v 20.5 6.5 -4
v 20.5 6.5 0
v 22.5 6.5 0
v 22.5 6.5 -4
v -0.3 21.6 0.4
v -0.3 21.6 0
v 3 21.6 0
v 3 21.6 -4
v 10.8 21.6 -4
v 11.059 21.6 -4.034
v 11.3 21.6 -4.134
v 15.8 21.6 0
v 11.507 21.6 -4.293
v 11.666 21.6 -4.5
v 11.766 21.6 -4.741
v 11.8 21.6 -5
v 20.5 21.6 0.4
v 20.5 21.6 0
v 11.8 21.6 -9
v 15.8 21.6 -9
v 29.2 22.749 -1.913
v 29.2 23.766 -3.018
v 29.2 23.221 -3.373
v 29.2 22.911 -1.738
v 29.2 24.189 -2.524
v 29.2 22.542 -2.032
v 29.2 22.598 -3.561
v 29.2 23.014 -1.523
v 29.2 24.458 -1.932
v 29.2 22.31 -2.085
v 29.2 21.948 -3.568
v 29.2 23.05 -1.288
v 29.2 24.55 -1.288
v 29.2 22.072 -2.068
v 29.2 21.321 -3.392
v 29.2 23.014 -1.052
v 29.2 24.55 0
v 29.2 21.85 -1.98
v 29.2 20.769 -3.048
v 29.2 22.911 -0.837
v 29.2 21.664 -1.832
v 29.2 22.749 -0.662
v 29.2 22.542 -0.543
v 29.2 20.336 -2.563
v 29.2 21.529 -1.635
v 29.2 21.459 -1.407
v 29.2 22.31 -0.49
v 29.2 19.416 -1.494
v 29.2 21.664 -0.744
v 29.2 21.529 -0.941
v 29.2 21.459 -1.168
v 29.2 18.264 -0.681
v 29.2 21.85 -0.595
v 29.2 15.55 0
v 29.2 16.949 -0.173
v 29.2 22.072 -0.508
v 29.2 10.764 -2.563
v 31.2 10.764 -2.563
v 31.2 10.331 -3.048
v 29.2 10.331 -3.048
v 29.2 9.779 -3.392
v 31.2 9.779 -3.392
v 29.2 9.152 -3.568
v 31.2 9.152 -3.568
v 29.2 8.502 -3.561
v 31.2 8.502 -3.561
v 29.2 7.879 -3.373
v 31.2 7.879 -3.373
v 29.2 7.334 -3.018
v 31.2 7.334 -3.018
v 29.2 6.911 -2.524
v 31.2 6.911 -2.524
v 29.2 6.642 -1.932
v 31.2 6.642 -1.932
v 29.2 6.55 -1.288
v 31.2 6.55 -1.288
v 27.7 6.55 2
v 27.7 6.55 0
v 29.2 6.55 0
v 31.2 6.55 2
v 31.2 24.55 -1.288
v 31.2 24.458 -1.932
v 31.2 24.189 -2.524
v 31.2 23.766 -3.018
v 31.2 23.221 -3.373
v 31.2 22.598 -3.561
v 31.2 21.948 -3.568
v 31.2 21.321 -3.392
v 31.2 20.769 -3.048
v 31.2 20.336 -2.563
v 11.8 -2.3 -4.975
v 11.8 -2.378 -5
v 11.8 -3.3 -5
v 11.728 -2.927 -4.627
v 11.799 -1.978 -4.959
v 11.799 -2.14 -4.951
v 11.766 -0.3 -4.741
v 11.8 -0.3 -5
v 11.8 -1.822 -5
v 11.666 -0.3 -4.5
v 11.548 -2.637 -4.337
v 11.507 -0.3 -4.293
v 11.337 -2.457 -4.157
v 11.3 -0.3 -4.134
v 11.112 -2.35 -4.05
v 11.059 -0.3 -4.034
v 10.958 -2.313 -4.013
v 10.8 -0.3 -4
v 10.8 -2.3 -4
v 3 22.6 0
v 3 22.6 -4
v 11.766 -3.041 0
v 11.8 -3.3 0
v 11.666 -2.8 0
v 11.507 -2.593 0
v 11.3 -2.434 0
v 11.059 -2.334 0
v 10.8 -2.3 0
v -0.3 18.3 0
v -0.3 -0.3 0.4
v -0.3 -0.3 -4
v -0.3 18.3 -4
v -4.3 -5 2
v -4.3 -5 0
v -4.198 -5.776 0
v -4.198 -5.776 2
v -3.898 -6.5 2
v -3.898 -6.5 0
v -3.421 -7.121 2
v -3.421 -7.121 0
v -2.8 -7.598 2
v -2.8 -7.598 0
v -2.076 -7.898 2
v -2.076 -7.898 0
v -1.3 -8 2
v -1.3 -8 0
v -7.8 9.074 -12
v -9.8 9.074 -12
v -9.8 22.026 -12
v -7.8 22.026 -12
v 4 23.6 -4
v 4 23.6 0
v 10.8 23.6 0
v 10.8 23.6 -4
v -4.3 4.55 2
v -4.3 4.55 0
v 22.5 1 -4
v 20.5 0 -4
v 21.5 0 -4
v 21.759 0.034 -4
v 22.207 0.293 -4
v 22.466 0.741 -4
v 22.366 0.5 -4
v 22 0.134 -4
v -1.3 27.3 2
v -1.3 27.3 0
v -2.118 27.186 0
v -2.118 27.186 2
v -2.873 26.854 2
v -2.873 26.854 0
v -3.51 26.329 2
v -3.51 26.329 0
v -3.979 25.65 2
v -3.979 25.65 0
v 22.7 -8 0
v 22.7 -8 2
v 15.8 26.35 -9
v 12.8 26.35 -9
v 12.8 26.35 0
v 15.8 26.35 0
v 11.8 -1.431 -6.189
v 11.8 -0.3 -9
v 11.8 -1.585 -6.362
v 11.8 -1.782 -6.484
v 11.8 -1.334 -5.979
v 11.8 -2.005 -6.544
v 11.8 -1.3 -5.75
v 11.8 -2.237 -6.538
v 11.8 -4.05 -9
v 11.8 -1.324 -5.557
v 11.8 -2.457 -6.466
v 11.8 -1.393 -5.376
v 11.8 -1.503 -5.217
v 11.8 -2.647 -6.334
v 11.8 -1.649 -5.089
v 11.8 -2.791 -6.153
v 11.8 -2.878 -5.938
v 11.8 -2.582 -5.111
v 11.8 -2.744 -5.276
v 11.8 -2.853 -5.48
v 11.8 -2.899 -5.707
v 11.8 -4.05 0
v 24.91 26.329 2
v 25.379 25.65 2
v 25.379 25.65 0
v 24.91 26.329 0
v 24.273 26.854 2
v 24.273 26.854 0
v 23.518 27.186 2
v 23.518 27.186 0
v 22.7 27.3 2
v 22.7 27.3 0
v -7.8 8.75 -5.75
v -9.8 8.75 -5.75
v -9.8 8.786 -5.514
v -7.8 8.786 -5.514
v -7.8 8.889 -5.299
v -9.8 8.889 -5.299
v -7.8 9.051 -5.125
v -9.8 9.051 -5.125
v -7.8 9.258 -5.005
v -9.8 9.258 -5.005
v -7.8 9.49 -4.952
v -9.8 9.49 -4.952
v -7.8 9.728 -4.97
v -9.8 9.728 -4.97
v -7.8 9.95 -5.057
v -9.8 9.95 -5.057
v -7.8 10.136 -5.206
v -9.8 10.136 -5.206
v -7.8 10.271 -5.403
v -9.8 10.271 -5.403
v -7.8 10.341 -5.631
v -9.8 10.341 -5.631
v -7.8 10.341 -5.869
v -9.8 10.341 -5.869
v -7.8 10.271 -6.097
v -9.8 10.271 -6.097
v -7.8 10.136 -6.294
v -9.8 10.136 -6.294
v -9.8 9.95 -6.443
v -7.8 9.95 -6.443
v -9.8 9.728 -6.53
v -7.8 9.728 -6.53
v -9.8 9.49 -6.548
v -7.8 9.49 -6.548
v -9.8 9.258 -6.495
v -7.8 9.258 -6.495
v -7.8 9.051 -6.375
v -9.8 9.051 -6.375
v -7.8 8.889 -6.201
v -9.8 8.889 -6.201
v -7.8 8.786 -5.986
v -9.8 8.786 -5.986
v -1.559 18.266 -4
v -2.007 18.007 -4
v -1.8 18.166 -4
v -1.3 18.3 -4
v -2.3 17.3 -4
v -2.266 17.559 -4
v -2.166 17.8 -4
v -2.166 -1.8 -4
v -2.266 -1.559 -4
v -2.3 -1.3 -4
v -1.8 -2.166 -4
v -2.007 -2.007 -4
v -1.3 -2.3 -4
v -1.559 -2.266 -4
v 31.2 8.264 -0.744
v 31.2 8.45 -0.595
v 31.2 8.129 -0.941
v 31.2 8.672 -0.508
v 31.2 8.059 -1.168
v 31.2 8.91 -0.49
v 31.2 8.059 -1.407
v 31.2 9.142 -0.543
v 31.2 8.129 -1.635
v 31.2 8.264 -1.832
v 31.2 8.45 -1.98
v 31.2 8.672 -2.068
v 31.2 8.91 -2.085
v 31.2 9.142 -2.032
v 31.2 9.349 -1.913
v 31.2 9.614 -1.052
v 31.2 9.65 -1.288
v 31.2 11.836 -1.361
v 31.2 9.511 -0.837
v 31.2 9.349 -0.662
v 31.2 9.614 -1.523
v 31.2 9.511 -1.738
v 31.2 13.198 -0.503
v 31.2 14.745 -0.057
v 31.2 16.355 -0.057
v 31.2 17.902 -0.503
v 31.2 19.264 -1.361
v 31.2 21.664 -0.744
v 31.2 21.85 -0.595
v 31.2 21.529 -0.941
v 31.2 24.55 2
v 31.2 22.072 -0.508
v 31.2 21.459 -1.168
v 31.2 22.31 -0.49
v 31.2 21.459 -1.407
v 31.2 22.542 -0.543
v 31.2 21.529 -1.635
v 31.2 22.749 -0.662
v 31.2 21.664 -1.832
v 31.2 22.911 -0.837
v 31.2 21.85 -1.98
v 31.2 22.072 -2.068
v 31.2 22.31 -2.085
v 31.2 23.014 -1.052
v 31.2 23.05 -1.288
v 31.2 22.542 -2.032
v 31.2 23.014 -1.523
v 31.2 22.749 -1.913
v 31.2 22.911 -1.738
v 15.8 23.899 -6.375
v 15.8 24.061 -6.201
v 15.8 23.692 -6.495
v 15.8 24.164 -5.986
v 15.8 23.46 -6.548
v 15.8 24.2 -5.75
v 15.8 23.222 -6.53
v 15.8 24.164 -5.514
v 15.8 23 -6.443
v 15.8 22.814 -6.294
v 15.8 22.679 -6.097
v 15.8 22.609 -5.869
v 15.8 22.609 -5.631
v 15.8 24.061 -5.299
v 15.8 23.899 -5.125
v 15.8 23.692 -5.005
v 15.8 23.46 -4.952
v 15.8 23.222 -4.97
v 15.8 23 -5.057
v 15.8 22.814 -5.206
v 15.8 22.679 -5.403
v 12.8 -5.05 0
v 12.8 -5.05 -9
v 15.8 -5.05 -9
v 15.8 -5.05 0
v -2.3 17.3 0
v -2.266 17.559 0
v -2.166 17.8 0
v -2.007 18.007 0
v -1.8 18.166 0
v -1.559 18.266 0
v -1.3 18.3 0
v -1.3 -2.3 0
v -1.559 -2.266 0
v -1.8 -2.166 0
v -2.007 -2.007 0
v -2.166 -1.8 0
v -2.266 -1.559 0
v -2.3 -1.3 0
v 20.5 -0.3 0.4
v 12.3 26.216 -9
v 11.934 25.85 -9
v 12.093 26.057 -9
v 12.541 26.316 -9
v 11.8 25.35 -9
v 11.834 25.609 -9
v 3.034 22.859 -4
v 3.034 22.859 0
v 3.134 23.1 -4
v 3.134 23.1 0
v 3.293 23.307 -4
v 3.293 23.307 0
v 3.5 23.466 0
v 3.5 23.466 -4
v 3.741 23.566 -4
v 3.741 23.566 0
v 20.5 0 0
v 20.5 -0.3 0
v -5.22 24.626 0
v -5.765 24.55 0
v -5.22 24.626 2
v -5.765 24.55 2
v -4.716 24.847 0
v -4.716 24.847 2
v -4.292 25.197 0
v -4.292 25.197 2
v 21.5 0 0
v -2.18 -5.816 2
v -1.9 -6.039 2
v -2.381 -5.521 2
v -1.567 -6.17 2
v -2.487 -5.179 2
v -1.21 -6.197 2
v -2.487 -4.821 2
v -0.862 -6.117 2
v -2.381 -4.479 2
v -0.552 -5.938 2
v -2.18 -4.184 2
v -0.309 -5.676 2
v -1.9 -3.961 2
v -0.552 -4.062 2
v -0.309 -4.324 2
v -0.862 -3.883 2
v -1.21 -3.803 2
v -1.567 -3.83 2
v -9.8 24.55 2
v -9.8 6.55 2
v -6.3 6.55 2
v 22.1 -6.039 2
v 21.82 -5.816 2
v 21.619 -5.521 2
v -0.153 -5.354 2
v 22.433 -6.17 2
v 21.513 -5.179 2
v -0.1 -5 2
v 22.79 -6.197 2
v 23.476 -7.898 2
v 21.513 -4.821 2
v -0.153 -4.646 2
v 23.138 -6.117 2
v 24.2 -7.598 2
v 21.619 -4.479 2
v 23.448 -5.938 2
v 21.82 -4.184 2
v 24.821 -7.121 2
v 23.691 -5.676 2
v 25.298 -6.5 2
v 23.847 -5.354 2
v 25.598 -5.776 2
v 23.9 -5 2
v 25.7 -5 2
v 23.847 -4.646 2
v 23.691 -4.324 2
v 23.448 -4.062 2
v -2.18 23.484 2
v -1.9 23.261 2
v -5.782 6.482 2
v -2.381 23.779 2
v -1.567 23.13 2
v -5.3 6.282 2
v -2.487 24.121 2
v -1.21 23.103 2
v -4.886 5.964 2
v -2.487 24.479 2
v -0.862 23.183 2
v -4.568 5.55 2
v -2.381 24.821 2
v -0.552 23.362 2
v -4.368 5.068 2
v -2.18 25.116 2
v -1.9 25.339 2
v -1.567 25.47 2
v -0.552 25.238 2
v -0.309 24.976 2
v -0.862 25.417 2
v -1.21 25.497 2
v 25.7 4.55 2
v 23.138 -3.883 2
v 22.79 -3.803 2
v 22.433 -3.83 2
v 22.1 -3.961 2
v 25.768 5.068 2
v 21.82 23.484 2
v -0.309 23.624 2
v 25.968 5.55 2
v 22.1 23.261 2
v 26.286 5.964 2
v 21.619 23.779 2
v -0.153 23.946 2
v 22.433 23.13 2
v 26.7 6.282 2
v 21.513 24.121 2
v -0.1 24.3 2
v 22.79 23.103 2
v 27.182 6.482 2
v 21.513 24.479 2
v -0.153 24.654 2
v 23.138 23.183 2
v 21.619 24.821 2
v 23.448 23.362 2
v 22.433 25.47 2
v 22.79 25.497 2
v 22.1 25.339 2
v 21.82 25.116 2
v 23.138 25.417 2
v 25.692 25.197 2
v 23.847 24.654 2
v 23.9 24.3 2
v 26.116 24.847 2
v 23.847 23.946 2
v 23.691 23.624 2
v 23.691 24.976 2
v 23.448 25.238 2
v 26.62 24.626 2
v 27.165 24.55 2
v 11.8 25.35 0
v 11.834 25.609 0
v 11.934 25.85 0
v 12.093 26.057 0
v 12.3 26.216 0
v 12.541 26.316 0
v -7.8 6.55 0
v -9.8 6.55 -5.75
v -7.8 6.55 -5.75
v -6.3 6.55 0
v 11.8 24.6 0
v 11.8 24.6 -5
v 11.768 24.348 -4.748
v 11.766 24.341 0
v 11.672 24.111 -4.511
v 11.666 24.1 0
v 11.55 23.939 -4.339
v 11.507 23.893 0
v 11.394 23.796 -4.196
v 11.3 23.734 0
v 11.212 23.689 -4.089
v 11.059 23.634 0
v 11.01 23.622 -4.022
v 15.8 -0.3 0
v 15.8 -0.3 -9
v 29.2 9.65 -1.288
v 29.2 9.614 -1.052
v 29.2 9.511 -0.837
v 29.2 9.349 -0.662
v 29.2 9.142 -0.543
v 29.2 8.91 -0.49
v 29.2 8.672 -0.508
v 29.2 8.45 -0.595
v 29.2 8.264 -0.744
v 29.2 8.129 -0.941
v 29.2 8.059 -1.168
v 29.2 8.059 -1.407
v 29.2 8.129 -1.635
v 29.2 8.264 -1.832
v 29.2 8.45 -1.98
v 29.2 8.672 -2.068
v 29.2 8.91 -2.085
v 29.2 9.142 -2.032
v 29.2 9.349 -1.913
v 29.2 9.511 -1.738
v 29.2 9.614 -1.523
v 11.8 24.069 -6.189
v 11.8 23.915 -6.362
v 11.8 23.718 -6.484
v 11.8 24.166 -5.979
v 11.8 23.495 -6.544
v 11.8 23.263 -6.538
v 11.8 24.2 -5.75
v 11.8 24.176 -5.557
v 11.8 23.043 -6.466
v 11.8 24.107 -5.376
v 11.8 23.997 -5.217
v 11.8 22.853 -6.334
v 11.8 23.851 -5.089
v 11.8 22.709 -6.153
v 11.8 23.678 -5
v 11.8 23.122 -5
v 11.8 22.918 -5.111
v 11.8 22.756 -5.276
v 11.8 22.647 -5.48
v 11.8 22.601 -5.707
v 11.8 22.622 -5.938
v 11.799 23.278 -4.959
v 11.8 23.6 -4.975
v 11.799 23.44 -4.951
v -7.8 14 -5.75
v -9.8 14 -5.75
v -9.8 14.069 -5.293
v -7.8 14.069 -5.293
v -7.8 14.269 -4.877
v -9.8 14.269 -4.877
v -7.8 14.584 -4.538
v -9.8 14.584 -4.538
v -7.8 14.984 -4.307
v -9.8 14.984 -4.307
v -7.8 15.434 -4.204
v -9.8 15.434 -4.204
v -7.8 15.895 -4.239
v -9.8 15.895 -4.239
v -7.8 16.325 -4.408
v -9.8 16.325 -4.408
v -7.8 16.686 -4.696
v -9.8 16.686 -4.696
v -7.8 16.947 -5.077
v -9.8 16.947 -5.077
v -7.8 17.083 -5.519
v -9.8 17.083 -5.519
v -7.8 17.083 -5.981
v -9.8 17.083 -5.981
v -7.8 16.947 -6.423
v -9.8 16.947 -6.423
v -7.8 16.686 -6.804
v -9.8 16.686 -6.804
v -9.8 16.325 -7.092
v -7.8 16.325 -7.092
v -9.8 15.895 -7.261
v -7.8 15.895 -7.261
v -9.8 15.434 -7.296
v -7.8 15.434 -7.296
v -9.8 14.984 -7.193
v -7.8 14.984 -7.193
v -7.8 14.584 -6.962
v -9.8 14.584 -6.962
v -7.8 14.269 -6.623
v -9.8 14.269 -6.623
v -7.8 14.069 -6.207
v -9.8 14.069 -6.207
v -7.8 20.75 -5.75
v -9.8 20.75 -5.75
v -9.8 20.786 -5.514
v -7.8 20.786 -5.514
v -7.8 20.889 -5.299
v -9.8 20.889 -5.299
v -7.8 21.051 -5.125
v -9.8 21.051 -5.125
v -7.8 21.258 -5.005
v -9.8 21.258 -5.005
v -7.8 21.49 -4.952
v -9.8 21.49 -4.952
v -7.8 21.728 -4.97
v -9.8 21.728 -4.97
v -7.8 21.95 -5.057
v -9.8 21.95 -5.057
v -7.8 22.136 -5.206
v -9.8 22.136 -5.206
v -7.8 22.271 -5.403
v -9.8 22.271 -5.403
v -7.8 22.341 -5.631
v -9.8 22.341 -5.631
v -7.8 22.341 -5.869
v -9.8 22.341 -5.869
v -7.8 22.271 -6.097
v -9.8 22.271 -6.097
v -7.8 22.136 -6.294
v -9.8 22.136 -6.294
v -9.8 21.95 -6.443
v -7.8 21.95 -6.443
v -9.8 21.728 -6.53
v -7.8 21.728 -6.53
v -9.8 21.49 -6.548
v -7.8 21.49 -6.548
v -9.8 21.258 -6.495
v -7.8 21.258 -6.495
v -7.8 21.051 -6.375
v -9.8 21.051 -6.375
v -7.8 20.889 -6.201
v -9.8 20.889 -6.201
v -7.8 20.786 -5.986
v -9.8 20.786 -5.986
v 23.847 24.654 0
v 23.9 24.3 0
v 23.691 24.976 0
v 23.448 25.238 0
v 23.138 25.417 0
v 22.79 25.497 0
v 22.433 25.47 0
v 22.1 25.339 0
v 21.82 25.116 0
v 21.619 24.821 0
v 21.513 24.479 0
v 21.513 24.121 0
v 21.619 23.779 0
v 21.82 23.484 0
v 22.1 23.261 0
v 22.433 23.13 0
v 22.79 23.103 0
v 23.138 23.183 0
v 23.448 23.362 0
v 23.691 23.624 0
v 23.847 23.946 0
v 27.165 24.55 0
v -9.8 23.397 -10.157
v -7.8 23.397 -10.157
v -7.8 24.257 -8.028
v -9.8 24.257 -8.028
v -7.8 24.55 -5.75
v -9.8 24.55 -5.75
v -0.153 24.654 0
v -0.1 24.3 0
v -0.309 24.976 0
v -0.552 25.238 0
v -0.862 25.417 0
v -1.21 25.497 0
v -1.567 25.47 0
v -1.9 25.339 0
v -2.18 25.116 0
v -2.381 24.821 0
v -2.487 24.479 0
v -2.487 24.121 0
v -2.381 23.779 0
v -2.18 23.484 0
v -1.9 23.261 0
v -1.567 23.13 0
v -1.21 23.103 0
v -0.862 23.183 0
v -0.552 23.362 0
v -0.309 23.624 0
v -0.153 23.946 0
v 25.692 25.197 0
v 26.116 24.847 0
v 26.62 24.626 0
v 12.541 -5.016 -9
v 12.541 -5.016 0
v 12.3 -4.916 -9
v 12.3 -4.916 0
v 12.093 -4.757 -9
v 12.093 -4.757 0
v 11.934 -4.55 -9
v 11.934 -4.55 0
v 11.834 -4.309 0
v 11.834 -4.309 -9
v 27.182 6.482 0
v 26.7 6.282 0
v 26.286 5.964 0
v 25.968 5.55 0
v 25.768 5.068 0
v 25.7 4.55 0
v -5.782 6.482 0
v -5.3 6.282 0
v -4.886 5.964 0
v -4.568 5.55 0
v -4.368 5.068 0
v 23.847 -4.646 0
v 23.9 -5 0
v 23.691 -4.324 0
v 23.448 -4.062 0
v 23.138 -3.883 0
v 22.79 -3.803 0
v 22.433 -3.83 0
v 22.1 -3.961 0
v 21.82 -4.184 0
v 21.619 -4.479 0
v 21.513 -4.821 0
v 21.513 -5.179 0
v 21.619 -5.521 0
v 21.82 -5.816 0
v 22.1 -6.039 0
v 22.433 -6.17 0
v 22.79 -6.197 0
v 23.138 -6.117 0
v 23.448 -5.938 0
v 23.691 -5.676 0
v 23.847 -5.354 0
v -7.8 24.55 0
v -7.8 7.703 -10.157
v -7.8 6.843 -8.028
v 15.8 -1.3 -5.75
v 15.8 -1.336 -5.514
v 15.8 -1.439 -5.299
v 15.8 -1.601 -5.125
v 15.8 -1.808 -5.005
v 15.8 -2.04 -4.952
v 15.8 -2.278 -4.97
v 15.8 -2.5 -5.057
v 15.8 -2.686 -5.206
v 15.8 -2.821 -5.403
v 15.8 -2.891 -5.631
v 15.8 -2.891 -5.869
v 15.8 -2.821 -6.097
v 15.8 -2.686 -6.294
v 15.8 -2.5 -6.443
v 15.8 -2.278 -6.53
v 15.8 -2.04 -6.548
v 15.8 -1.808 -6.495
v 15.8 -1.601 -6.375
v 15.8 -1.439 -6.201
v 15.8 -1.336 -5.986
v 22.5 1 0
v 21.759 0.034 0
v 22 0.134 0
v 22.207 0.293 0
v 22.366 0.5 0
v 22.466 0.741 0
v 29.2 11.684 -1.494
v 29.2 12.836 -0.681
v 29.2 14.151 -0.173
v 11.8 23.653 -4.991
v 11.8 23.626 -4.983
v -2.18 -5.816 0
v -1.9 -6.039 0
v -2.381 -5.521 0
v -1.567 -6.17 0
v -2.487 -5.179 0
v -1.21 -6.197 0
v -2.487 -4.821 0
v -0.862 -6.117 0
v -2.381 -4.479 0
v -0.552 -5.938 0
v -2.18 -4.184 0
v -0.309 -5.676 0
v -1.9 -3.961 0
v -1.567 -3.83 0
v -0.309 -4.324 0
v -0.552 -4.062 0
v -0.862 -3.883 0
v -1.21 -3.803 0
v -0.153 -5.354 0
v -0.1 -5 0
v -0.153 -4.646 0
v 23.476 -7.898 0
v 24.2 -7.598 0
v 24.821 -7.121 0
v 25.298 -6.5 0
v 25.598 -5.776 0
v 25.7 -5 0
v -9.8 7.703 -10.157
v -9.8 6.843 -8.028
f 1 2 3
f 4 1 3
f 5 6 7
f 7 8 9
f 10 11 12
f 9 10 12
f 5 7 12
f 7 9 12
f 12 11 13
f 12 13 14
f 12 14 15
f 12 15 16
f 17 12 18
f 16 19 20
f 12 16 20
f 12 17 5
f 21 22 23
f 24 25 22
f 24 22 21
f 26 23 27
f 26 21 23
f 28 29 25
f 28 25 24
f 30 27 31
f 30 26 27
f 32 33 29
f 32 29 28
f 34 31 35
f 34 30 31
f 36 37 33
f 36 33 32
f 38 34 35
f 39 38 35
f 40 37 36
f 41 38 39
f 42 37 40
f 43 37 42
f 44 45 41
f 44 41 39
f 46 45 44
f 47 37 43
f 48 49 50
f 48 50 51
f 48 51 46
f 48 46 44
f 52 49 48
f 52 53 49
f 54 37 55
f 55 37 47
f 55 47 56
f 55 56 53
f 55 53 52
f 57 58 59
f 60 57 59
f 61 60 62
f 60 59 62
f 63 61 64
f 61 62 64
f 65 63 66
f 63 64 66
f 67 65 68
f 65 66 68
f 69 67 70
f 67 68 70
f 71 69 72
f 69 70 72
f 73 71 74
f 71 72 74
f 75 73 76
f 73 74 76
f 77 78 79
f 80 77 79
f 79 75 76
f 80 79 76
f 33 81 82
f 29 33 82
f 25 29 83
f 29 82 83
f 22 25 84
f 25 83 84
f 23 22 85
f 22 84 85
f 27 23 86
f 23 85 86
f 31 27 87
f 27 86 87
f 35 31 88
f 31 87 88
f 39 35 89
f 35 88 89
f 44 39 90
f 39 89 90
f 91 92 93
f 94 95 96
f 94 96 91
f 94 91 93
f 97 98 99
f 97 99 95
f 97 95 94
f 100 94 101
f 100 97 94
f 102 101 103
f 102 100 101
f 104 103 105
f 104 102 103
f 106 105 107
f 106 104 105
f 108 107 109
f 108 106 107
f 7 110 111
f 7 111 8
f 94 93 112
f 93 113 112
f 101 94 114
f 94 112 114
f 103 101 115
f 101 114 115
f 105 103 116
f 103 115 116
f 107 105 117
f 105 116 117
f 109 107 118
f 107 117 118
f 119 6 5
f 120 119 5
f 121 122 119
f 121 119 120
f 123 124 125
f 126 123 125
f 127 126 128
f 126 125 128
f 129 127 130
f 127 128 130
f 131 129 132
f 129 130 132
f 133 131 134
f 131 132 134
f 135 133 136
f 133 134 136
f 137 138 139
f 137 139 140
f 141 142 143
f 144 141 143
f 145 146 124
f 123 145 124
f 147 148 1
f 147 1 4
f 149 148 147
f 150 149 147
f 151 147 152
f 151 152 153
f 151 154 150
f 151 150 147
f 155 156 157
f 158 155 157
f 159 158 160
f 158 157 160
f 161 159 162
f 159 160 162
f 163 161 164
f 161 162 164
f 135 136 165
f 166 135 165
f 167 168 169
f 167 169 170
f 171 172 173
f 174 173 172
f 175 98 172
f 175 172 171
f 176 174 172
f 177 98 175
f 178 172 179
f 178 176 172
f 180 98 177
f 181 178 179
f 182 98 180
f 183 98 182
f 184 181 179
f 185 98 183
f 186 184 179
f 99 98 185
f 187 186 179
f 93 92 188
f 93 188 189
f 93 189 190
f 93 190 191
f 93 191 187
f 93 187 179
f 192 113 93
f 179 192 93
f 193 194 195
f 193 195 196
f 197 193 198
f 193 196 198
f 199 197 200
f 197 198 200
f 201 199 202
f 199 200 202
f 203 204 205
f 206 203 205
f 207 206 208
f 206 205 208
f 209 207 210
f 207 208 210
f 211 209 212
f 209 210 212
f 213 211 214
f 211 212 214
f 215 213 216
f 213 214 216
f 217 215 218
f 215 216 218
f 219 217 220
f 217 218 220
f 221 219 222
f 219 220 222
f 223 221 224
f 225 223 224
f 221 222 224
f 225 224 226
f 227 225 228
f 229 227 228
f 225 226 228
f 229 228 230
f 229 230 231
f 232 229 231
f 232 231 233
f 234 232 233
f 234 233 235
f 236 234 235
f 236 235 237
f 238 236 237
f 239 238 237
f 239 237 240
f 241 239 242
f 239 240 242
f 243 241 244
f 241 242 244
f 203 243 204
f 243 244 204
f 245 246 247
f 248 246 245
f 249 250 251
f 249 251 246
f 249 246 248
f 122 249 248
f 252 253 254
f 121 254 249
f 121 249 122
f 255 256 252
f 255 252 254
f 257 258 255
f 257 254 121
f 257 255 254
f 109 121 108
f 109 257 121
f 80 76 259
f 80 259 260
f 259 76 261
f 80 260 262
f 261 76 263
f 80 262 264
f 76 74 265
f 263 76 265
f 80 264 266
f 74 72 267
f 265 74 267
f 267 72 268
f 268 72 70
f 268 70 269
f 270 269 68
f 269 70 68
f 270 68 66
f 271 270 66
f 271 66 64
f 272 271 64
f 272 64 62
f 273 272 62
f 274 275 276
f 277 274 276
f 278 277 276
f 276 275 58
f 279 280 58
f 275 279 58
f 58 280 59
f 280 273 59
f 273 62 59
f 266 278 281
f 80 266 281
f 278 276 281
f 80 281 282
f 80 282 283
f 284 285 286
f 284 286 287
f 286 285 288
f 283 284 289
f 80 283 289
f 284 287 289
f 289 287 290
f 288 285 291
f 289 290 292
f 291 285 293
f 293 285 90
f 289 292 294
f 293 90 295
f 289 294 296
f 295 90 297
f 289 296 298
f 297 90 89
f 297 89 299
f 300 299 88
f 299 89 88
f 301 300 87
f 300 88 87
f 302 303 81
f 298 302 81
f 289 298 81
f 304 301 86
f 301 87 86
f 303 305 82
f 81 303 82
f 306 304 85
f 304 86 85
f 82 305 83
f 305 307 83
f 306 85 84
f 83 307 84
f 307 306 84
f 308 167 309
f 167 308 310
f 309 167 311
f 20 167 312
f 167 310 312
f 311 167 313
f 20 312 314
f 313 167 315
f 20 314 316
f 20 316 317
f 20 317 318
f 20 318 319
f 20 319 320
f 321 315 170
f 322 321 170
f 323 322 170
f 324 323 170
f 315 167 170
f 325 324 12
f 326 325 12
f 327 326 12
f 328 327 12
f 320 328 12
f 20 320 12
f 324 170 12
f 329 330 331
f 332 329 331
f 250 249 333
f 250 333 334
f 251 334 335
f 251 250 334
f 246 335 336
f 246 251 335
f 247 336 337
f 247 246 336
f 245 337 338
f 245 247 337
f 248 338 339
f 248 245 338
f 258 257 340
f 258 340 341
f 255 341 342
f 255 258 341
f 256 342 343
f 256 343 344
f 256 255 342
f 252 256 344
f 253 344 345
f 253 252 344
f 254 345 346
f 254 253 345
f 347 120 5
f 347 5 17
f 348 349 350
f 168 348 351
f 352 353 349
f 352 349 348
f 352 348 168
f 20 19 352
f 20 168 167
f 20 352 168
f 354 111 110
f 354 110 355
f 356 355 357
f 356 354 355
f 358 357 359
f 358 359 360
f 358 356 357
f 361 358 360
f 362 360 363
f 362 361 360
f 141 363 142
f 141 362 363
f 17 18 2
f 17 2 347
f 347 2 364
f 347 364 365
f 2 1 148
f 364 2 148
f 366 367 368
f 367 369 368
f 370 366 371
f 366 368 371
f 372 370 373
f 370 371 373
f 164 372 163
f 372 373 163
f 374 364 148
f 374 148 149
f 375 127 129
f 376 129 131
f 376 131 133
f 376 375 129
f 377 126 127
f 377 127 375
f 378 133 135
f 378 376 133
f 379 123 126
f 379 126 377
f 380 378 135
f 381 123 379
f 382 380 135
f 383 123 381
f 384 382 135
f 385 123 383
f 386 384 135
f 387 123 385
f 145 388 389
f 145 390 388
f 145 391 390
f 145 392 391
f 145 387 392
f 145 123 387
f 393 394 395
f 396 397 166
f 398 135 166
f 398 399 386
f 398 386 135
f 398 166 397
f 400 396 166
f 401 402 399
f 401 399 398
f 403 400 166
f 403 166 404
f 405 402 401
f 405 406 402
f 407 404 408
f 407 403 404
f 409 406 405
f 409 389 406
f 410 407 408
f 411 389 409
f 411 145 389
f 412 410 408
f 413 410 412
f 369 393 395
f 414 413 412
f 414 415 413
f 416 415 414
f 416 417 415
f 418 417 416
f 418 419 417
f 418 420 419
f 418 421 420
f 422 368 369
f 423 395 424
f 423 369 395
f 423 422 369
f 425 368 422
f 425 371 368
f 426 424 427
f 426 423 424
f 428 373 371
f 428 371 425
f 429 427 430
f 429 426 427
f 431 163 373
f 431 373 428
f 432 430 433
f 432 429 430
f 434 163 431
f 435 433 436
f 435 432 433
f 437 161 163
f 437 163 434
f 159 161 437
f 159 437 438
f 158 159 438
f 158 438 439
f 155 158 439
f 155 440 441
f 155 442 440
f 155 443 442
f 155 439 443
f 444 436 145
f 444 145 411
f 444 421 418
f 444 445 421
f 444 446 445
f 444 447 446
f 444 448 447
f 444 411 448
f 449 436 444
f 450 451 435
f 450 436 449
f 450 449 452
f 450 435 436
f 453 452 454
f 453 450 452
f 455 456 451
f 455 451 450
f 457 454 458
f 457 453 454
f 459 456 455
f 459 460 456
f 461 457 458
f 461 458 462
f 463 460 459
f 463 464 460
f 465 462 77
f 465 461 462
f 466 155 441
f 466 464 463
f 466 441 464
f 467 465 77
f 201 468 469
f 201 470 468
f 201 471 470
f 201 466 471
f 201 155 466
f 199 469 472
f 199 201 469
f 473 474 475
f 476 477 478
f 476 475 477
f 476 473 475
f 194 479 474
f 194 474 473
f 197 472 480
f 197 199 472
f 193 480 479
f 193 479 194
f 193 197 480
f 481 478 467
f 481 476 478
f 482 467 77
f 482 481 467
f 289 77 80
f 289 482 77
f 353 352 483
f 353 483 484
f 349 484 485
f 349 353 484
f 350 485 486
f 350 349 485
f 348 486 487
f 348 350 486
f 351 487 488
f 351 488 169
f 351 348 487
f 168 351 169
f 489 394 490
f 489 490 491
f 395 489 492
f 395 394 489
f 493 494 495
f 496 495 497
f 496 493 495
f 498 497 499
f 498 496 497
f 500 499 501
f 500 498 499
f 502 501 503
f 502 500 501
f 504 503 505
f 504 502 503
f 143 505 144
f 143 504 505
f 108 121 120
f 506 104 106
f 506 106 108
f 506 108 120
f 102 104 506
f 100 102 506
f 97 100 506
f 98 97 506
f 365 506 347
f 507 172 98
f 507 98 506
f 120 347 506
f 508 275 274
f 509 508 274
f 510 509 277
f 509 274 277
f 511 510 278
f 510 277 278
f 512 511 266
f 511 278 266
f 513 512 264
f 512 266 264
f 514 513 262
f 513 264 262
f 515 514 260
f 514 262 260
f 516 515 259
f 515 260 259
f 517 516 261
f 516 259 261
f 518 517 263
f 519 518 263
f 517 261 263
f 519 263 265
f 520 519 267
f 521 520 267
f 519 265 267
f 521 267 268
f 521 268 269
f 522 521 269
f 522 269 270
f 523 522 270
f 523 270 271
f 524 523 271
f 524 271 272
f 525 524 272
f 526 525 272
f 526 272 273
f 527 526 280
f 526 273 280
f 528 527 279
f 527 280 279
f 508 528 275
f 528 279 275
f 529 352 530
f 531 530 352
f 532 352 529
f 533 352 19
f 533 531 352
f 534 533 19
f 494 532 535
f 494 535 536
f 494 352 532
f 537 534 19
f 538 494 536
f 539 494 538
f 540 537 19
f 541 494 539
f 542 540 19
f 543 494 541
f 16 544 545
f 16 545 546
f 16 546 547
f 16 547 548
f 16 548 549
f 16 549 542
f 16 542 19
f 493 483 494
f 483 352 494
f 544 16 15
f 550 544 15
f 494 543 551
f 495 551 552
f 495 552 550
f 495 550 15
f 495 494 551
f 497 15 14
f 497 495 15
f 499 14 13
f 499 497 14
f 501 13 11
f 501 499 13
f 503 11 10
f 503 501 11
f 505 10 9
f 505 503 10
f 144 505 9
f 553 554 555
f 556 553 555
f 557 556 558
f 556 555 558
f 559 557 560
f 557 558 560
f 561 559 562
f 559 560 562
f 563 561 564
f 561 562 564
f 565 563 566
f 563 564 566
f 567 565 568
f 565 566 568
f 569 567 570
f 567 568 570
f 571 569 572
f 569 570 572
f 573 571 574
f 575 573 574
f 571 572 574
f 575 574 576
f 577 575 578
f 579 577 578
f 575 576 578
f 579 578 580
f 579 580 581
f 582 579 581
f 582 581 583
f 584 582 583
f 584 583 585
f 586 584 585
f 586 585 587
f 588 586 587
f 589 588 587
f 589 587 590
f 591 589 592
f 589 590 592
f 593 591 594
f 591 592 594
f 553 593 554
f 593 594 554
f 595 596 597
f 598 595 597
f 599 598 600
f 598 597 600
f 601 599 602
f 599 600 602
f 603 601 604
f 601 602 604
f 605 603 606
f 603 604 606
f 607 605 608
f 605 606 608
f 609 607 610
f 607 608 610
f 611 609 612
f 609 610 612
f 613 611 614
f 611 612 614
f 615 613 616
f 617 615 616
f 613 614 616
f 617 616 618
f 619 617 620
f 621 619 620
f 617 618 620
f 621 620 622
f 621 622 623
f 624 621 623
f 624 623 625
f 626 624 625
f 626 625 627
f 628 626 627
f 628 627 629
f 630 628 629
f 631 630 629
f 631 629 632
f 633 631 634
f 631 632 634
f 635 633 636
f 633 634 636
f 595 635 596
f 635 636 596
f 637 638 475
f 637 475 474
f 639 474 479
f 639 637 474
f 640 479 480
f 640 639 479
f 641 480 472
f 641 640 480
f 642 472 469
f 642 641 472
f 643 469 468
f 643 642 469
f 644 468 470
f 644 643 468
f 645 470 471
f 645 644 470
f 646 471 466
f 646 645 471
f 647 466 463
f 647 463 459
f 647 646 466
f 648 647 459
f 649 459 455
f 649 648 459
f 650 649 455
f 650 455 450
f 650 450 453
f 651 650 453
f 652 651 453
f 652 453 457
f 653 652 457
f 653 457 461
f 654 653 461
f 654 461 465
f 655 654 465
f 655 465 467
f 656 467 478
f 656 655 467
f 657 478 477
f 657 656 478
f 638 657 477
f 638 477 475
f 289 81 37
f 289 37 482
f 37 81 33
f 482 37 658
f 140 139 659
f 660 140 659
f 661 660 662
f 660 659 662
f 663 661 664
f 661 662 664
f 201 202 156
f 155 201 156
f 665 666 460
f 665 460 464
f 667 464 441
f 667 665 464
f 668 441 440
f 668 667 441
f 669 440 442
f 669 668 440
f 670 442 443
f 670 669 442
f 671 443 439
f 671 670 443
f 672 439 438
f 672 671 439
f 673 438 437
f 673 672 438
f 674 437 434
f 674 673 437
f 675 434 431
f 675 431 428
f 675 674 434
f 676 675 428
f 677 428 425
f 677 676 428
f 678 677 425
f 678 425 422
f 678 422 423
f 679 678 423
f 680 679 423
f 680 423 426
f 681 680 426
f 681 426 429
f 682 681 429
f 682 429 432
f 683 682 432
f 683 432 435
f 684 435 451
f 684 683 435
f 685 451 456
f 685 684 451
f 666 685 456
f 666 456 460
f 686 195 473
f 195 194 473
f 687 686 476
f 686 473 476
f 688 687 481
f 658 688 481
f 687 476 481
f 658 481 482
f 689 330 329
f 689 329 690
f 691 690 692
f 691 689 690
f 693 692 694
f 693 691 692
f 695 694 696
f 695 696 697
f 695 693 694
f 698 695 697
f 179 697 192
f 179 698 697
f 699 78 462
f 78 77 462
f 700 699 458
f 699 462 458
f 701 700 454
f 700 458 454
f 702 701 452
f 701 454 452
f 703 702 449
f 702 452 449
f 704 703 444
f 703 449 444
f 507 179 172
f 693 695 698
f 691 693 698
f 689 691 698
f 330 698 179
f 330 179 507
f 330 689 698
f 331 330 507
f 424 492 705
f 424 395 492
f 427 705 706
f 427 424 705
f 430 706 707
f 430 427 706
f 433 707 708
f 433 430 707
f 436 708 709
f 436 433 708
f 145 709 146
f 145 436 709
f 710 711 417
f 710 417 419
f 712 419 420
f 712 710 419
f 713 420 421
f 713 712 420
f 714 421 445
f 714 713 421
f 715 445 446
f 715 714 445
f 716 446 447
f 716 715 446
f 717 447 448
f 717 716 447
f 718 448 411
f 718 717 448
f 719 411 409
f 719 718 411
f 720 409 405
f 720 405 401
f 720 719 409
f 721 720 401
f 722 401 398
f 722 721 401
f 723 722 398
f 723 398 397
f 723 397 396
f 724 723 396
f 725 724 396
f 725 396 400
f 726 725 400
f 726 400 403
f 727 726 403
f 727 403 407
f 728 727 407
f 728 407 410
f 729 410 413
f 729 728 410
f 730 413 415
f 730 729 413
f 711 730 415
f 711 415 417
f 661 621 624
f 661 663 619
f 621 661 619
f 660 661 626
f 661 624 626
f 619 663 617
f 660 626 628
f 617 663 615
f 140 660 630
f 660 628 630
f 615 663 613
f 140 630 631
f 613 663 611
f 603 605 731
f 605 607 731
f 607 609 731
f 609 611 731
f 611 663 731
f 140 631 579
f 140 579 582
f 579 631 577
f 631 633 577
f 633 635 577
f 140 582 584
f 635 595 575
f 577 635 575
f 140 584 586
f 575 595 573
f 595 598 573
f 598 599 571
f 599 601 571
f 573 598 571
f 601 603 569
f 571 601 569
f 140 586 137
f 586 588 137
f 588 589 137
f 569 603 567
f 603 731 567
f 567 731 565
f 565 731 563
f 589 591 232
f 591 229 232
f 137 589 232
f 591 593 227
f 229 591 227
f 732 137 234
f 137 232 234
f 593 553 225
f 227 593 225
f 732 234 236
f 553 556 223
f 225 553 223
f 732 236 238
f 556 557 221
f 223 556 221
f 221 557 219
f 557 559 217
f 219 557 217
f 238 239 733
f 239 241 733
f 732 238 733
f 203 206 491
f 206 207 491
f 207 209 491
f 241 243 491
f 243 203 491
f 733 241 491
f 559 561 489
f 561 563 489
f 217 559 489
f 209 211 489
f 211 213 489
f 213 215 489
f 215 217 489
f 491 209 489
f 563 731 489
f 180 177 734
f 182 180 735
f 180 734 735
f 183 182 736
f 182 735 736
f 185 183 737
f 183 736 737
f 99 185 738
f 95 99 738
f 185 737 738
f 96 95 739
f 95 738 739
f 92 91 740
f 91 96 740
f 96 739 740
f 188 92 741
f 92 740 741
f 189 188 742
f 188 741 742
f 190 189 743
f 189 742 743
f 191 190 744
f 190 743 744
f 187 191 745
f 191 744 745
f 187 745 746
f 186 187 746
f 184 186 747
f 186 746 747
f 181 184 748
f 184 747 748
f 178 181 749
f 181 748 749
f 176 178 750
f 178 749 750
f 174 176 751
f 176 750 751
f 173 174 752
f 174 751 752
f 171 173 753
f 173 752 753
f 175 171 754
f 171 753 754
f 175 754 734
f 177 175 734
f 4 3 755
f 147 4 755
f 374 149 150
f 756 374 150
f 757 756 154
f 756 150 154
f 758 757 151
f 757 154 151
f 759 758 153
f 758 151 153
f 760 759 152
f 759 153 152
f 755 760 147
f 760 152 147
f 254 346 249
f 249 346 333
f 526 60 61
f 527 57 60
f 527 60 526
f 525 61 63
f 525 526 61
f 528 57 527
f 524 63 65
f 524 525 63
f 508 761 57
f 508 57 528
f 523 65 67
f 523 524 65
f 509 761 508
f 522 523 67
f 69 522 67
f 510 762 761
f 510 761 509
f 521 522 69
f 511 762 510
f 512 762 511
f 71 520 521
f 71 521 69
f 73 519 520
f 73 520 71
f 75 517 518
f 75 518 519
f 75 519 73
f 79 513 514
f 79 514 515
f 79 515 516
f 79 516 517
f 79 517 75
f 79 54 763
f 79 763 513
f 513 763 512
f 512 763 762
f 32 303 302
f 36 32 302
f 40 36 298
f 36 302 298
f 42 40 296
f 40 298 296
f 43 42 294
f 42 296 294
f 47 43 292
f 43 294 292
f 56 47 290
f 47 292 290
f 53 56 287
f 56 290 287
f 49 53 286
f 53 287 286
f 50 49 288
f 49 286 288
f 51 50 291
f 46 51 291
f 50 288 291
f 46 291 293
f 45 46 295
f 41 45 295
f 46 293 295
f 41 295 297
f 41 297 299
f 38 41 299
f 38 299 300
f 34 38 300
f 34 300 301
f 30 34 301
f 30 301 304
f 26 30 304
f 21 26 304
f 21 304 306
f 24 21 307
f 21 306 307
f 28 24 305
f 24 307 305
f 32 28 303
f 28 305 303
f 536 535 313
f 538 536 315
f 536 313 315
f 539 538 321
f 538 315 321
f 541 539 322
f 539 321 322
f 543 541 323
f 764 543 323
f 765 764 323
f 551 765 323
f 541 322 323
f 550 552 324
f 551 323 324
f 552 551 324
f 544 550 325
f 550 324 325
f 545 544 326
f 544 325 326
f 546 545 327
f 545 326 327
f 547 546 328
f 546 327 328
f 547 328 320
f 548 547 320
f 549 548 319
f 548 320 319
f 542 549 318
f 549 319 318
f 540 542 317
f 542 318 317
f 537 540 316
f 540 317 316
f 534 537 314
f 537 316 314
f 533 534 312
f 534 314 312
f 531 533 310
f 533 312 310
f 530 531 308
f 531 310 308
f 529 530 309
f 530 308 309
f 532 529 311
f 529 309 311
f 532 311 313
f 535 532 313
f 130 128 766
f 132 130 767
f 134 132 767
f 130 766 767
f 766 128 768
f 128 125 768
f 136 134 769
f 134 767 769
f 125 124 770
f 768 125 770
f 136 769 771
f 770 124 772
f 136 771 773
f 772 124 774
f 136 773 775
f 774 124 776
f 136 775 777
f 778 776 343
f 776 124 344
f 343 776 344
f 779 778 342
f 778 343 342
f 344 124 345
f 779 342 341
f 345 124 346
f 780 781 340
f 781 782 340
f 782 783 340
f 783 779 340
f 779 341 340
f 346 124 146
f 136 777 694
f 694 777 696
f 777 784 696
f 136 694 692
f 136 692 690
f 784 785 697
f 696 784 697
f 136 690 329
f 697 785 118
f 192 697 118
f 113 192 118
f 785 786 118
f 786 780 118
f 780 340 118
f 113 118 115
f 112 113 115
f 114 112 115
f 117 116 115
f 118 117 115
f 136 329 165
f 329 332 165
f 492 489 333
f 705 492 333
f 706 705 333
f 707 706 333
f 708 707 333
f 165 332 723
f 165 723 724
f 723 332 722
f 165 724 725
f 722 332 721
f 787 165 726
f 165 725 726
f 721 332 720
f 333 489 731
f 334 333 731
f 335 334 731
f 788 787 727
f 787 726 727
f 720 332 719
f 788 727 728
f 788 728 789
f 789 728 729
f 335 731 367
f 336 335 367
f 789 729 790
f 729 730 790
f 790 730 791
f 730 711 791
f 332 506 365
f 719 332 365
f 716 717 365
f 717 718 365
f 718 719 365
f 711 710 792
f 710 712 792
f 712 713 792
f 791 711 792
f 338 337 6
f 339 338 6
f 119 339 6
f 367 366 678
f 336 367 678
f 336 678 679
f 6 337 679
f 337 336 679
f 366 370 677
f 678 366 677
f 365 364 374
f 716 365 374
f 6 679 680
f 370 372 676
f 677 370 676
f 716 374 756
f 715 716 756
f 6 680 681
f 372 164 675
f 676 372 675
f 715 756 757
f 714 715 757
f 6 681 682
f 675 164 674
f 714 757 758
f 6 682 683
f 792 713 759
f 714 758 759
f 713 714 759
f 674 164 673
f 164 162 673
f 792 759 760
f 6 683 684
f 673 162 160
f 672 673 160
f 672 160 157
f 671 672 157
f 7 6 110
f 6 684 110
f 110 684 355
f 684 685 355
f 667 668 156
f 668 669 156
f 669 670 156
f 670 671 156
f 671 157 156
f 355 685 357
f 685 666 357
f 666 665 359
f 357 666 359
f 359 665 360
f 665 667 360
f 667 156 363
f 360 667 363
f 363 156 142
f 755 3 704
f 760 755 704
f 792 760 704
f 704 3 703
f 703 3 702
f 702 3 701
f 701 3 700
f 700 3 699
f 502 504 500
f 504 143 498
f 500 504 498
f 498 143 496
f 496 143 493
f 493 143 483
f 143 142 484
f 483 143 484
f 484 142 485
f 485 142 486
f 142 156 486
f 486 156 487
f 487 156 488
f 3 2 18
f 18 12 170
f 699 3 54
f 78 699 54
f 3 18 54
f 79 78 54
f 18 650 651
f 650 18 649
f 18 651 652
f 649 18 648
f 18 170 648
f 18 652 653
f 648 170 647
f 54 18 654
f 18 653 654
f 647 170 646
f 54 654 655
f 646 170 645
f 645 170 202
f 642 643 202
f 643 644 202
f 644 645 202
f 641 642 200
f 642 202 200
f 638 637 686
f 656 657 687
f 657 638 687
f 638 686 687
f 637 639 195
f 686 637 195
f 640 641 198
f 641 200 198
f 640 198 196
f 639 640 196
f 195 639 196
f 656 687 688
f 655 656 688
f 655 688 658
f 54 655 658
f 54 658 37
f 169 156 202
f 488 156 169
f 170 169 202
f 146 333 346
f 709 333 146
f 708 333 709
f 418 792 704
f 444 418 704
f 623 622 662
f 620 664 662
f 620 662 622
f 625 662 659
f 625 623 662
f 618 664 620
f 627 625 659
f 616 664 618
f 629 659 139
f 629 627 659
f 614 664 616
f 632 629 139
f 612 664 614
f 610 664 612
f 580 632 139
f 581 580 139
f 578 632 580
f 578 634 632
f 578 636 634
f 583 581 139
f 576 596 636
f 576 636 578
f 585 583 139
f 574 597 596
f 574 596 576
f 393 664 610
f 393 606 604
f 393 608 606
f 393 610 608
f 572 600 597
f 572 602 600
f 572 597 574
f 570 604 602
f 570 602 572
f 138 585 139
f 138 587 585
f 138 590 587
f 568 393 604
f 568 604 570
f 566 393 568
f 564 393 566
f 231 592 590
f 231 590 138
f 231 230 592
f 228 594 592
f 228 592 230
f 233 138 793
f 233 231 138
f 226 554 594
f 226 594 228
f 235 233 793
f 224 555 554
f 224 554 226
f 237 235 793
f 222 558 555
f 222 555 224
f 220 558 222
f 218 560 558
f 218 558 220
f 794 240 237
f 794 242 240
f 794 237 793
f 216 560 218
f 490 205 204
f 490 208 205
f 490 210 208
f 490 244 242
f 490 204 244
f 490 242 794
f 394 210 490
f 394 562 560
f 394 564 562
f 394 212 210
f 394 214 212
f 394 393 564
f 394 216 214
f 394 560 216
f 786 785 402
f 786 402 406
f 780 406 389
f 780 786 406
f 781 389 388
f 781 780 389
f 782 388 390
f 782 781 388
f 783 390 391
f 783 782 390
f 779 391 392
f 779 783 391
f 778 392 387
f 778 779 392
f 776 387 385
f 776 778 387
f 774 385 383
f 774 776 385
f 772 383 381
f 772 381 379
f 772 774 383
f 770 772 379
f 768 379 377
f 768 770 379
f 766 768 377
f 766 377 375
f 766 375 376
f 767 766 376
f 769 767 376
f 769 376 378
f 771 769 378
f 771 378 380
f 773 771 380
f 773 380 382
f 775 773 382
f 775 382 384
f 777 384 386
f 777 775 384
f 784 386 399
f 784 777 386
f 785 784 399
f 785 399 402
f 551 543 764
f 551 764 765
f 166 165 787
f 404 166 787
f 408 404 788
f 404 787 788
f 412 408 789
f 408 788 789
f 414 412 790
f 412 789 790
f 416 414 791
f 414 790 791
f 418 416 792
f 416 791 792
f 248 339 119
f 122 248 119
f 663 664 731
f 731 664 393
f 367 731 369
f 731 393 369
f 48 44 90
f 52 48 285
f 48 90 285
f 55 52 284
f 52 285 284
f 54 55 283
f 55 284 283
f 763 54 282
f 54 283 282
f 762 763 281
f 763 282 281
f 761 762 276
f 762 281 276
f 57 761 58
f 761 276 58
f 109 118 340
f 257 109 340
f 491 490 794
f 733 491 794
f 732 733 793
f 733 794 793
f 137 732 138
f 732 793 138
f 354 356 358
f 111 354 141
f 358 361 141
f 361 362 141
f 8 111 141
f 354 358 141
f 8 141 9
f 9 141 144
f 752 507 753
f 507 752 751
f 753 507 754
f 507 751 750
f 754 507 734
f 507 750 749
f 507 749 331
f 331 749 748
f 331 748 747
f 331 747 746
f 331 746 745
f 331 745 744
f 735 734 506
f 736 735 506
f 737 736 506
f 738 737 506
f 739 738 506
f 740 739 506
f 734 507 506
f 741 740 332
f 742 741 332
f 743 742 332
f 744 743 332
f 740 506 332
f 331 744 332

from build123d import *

# Parameters (mm, degrees)
F1_R          = 1.2
F2_DEPTH      = 2
F3_R          = 2
F4_W          = 4
F4_H          = 4.75
F5_DEPTH      = 9
F6_W          = 8.8
F6_H          = 2
F6_W_2        = 2
F6_H_2        = 6.5
F7_DEPTH      = 4
F8_R          = 0.8
F9_DEPTH      = 4
F10_T4_DEPTH  = 2
F10_S5_R      = 0.8
F10_T6_DEPTH  = 3
F10_T10_DEPTH = 6.5
F10_T15_DEPTH = 6.5
F10_T20_DEPTH = 2
F10_S21_R     = 0.8
F10_T22_DEPTH = 3
F10_T27_DEPTH = 6.5
F10_S29_R     = 0.8
F10_T30_DEPTH = 5
F10_T33_DEPTH = 4.5
F10_T40_DEPTH = 4.5
F10_T44_DEPTH = 6.5
F10_S46_R     = 0.8
F10_T47_DEPTH = 5
F10_T49_DEPTH = 6.5
F10_T51_DEPTH = 11.5
F11_W         = 2
F11_H         = 18
F12_DEPTH     = 12
F13_R         = 1.55
F13_R_2       = 0.8
F14_DEPTH     = 2
F15_R         = 0.8
F16_DEPTH     = 2
F18_W         = 20.8
F18_H         = 21.9
F19_DEPTH     = 0.4


# Not quite as in the source:
# - a fillet or chamfer that OpenCascade refuses, or shapes differently, is made with other operations: its cross-section is extruded or revolved along the edge and cut away or added
# - two fillets or chamfers of one size are made in one step


with BuildPart() as f2:
    # F1 (on Top) → F2 (new body)
    with BuildSketch(Plane.XY):
        with BuildLine():
            Line((-4.2895651858, 24.55), (-9.8, 24.55))
            Line((-9.8, 24.55), (-9.8, 6.55))
            Line((-9.8, 6.55), (-4.3, 6.55))
            Line((-4.3, 6.55), (-4.3, -5))
            ThreePointArc((-4.3, -5), (-3.4213203436, -7.1213203436), (-1.3, -8))
            Line((-1.3, -8), (22.7, -8))
            ThreePointArc((22.7, -8), (24.8213203436, -7.1213203436), (25.7, -5))
            Line((25.7, -5), (25.7, 6.55))
            Line((25.7, 6.55), (31.2, 6.55))
            Line((31.2, 6.55), (31.2, 24.55))
            Line((31.2, 24.55), (25.6895651858, 24.55))
            ThreePointArc((25.6895651858, 24.55), (24.7310096012, 26.5079402166), (22.7, 27.3))
            Line((22.7, 27.3), (-1.3, 27.3))
            ThreePointArc((-1.3, 27.3), (-3.3310096012, 26.5079402166), (-4.2895651858, 24.55))
        make_face()
        with Locations((-1.3, -5)):
            Circle(F1_R, mode=Mode.SUBTRACT)
        with Locations((22.7, -5)):
            Circle(F1_R, mode=Mode.SUBTRACT)
        with Locations((-1.3, 24.3)):
            Circle(F1_R, mode=Mode.SUBTRACT)
        with Locations((22.7, 24.3)):
            Circle(F1_R, mode=Mode.SUBTRACT)
    extrude(amount=F2_DEPTH)

    # F3
    f3_edges = [f2.edges().sort_by_distance(p)[0] for p in [
        (-4.289565, 24.55, 1),
        (-4.3, 6.55, 1),
        (25.7, 6.55, 1),
        (25.689565, 24.55, 1),
    ]]
    fillet(f3_edges, radius=F3_R)

    # F4 (on face) → F5 (join)
    with BuildSketch(Plane(origin=(0, 0, 0), x_dir=(1, 0, 0), z_dir=(0, 0, -1))):
        with Locations((13.8, 2.675)):
            Rectangle(F4_W, F4_H)
        with Locations((13.8, -23.975)):
            Rectangle(F4_W, F4_H)
    extrude(amount=F5_DEPTH)

    # F6 (on face) → F7 (join)
    with BuildSketch(Plane(origin=(0, 0, 0), x_dir=(1, 0, 0), z_dir=(0, 0, -1))):
        Polygon((-2.3, -18.3), (-0.3, -18.3), (-0.3, 0.3), (11.8, 0.3), (11.8, 2.3), (-2.3, 2.3), align=None)
        with Locations((7.4, -22.6)):
            Rectangle(F6_W, F6_H)
        with Locations((21.5, -3.25)):
            Rectangle(F6_W_2, F6_H_2)
    extrude(amount=F7_DEPTH)

    # F8 (on face) → F9 (cut, through all)
    with BuildSketch(Plane.YZ.offset(15.8)):
        with Locations((23.4, -5.75)):
            Circle(F8_R)
        with Locations((-2.1, -5.75)):
            Circle(F8_R)
    extrude(amount=-F9_DEPTH, mode=Mode.SUBTRACT)

    # F10: fillet of radius 1 on 10 edges, made by hand


with BuildPart() as f10_tool2:
    # F10_s3 → F10_t4 (new body)
    with BuildSketch(Plane.XZ.offset(0.3)):
        with BuildLine():
            ThreePointArc((11.8, -5), (11.5071067812, -4.2928932188), (10.8, -4))
            Line((10.8, -4), (11.8, -4))
            Line((11.8, -4), (11.8, -5))
        make_face()
    extrude(amount=F10_T4_DEPTH)

    # F10_s5 → F10_t6 (cut, symmetric)
    with BuildSketch(Plane.YZ.offset(11.3)):
        with Locations((-2.1, -5.75)):
            Circle(F10_S5_R)
    extrude(amount=F10_T6_DEPTH, both=True, mode=Mode.SUBTRACT)


with BuildPart() as f2_1:
    add(f2.part)

    # F10_t1: union F10_tool2
    add(f10_tool2.part)


with BuildPart() as f10_tool8:
    # F10_s9 → F10_t10 (new body)
    with BuildSketch(Plane.XY.offset(2.5)):
        with BuildLine():
            ThreePointArc((11.8, -3.3), (11.5071067812, -2.5928932188), (10.8, -2.3))
            Line((10.8, -2.3), (11.8, -2.3))
            Line((11.8, -2.3), (11.8, -3.3))
        make_face()
    extrude(amount=-F10_T10_DEPTH)

    split(bisect_by=Plane.XY.offset(2), keep=Keep.BOTTOM)


with BuildPart() as f2_2:
    add(f2_1.part)

    # F10_t7: union F10_tool8
    add(f10_tool8.part)


with BuildPart() as f10_tool13:
    # F10_s14 → F10_t15 (new body)
    with BuildSketch(Plane.XY.offset(2.5)):
        with BuildLine():
            ThreePointArc((11.8, 24.6), (11.5071067812, 23.8928932188), (10.8, 23.6))
            Line((10.8, 23.6), (11.8, 23.6))
            Line((11.8, 23.6), (11.8, 24.6))
        make_face()
    extrude(amount=-F10_T15_DEPTH)

    split(bisect_by=Plane.XY.offset(2), keep=Keep.BOTTOM)


with BuildPart() as f2_3:
    add(f2_2.part)

    # F10_t12: union F10_tool13
    add(f10_tool13.part)


with BuildPart() as f10_tool18:
    # F10_s19 → F10_t20 (new body)
    with BuildSketch(Plane.XZ.offset(-23.6)):
        with BuildLine():
            ThreePointArc((11.8, -5), (11.5071067812, -4.2928932188), (10.8, -4))
            Line((10.8, -4), (11.8, -4))
            Line((11.8, -4), (11.8, -5))
        make_face()
    extrude(amount=F10_T20_DEPTH)

    # F10_s21 → F10_t22 (cut, symmetric)
    with BuildSketch(Plane.YZ.offset(11.3)):
        with Locations((23.4, -5.75)):
            Circle(F10_S21_R)
    extrude(amount=F10_T22_DEPTH, both=True, mode=Mode.SUBTRACT)


with BuildPart() as f2_4:
    add(f2_3.part)

    # F10_t17: union F10_tool18
    add(f10_tool18.part)


with BuildPart() as f10_tool25:
    # F10_s26 → F10_t27 (new body)
    with BuildSketch(Plane.XY):
        with BuildLine():
            ThreePointArc((11.8, -3.3), (11.5071067812, -2.5928932188), (10.8, -2.3))
            Line((10.8, -2.3), (11.8, -2.3))
            Line((11.8, -2.3), (11.8, -3.3))
        make_face()
    extrude(amount=-F10_T27_DEPTH)

    split(bisect_by=Plane.XY.offset(-4), keep=Keep.BOTTOM)

    # F10_s29 → F10_t30 (cut, symmetric)
    with BuildSketch(Plane.YZ.offset(11.3)):
        with Locations((-2.1, -5.75)):
            Circle(F10_S29_R)
    extrude(amount=F10_T30_DEPTH, both=True, mode=Mode.SUBTRACT)


with BuildPart() as f10_tool31:
    # F10_s32 → F10_t33 (new body)
    with BuildSketch(Plane.XZ.offset(0.3)):
        with BuildLine():
            ThreePointArc((11.8, -5), (11.5071067812, -4.2928932188), (10.8, -4))
            Line((10.8, -4), (11.8, -4))
            Line((11.8, -4), (11.8, -5))
        make_face()
    extrude(amount=F10_T33_DEPTH)

    split(bisect_by=Plane.XZ.offset(2.3), keep=Keep.TOP)


with BuildPart() as f10_tool25_1:
    add(f10_tool25.part)

    # F10_t35: intersect F10_tool31
    add(f10_tool31.part, mode=Mode.INTERSECT)


with BuildPart() as f2_5:
    add(f2_4.part)

    # F10_t23: union F10_tool25
    add(f10_tool25_1.part)


with BuildPart() as f10_tool38:
    # F10_s39 → F10_t40 (new body)
    with BuildSketch(Plane.XZ.offset(-26.1)):
        with BuildLine():
            ThreePointArc((11.8, -5), (11.5071067812, -4.2928932188), (10.8, -4))
            Line((10.8, -4), (11.8, -4))
            Line((11.8, -4), (11.8, -5))
        make_face()
    extrude(amount=F10_T40_DEPTH)

    split(bisect_by=Plane.XZ.offset(-23.6), keep=Keep.BOTTOM)


with BuildPart() as f10_tool42:
    # F10_s43 → F10_t44 (new body)
    with BuildSketch(Plane.XY):
        with BuildLine():
            ThreePointArc((11.8, 24.6), (11.5071067812, 23.8928932188), (10.8, 23.6))
            Line((10.8, 23.6), (11.8, 23.6))
            Line((11.8, 23.6), (11.8, 24.6))
        make_face()
    extrude(amount=-F10_T44_DEPTH)

    split(bisect_by=Plane.XY.offset(-4), keep=Keep.BOTTOM)

    # F10_s46 → F10_t47 (cut, symmetric)
    with BuildSketch(Plane.YZ.offset(11.3)):
        with Locations((23.4, -5.75)):
            Circle(F10_S46_R)
    extrude(amount=F10_T47_DEPTH, both=True, mode=Mode.SUBTRACT)


with BuildPart() as f10_tool38_1:
    add(f10_tool38.part)

    # F10_t48: intersect F10_tool42
    add(f10_tool42.part, mode=Mode.INTERSECT)


with BuildPart() as f2_6:
    add(f2_5.part)

    # F10_t36: union F10_tool38
    add(f10_tool38_1.part)

    # F10_s50 → F10_t49 (cut)
    with BuildSketch(Plane.XY.offset(-6.5)):
        with BuildLine():
            ThreePointArc((-1.3, -2.3), (-2.0071067812, -2.0071067812), (-2.3, -1.3))
            Line((-2.3, -1.3), (-2.3, -2.3))
            Line((-2.3, -2.3), (-1.3, -2.3))
        make_face()
        with BuildLine():
            ThreePointArc((-2.3, 17.3), (-2.0071067812, 18.0071067812), (-1.3, 18.3))
            Line((-1.3, 18.3), (-2.3, 18.3))
            Line((-2.3, 18.3), (-2.3, 17.3))
        make_face()
        with BuildLine():
            ThreePointArc((3, 22.6), (3.2928932188, 23.3071067812), (4, 23.6))
            Line((4, 23.6), (3, 23.6))
            Line((3, 23.6), (3, 22.6))
        make_face()
        with BuildLine():
            ThreePointArc((21.5, 0), (22.2071067812, 0.2928932188), (22.5, 1))
            Line((22.5, 1), (22.5, 0))
            Line((22.5, 0), (21.5, 0))
        make_face()
    extrude(amount=F10_T49_DEPTH, mode=Mode.SUBTRACT)

    # F10_s52 → F10_t51 (cut)
    with BuildSketch(Plane.XY.offset(-11.5)):
        with BuildLine():
            ThreePointArc((11.8, 25.35), (12.0928932188, 26.0571067812), (12.8, 26.35))
            Line((12.8, 26.35), (11.8, 26.35))
            Line((11.8, 26.35), (11.8, 25.35))
        make_face()
        with BuildLine():
            ThreePointArc((12.8, -5.05), (12.0928932188, -4.7571067812), (11.8, -4.05))
            Line((11.8, -4.05), (11.8, -5.05))
            Line((11.8, -5.05), (12.8, -5.05))
        make_face()
    extrude(amount=F10_T51_DEPTH, mode=Mode.SUBTRACT)

    # F11 (on face) → F12 (join)
    with BuildSketch(Plane(origin=(0, 0, 0), x_dir=(1, 0, 0), z_dir=(0, 0, -1))):
        with Locations((-8.8, -15.55)):
            Rectangle(F11_W, F11_H)
        with Locations((30.2, -15.55)):
            Rectangle(F11_W, F11_H)
    extrude(amount=F12_DEPTH)

    # F13 (on face) → F14 (cut, through all)
    with BuildSketch(Plane(origin=(-9.8, 0, 0), x_dir=(0, -1, 0), z_dir=(-1, 0, 0))):
        with Locations((-15.55, -5.75)):
            Circle(F13_R)
        with Locations((-21.55, -5.75)):
            Circle(F13_R_2)
        with Locations((-9.55, -5.75)):
            Circle(F13_R_2)
        with BuildLine():
            ThreePointArc((-22.0259169235, -12), (-23.8951558497, -9.1202186642), (-24.55, -5.75))
            Line((-24.55, -5.75), (-24.55, -12))
            Line((-24.55, -12), (-22.0259169235, -12))
        make_face()
        with BuildLine():
            ThreePointArc((-6.55, -5.75), (-7.2048441503, -9.1202186642), (-9.0740830765, -12))
            Line((-9.0740830765, -12), (-6.55, -12))
            Line((-6.55, -12), (-6.55, -5.75))
        make_face()
    extrude(amount=-F14_DEPTH, mode=Mode.SUBTRACT)

    # F15 (on face) → F16 (cut, through all)
    with BuildSketch(Plane.YZ.offset(31.2)):
        with BuildLine():
            ThreePointArc((24.55, -1.2876575658), (22.9160115829, -3.4891181199), (20.3357142857, -2.562612547))
            ThreePointArc((20.3357142857, -2.562612547), (15.55, 0), (10.7642857143, -2.562612547))
            ThreePointArc((10.7642857143, -2.562612547), (8.1839884171, -3.4891181199), (6.55, -1.2876575658))
            Line((6.55, -1.2876575658), (6.55, -12))
            Line((6.55, -12), (24.55, -12))
            Line((24.55, -12), (24.55, -1.2876575658))
        make_face()
        with Locations((8.85, -1.2876575658)):
            Circle(F15_R)
        with Locations((22.25, -1.2876575658)):
            Circle(F15_R)
    extrude(amount=-F16_DEPTH, mode=Mode.SUBTRACT)

    # F18 (on face) → F19 (cut)
    with BuildSketch(Plane(origin=(0, 0, 0), x_dir=(1, 0, 0), z_dir=(0, 0, -1))):
        with Locations((10.1, -10.65)):
            Rectangle(F18_W, F18_H)
    extrude(amount=-F19_DEPTH, mode=Mode.SUBTRACT)


solid = f2_6.part
